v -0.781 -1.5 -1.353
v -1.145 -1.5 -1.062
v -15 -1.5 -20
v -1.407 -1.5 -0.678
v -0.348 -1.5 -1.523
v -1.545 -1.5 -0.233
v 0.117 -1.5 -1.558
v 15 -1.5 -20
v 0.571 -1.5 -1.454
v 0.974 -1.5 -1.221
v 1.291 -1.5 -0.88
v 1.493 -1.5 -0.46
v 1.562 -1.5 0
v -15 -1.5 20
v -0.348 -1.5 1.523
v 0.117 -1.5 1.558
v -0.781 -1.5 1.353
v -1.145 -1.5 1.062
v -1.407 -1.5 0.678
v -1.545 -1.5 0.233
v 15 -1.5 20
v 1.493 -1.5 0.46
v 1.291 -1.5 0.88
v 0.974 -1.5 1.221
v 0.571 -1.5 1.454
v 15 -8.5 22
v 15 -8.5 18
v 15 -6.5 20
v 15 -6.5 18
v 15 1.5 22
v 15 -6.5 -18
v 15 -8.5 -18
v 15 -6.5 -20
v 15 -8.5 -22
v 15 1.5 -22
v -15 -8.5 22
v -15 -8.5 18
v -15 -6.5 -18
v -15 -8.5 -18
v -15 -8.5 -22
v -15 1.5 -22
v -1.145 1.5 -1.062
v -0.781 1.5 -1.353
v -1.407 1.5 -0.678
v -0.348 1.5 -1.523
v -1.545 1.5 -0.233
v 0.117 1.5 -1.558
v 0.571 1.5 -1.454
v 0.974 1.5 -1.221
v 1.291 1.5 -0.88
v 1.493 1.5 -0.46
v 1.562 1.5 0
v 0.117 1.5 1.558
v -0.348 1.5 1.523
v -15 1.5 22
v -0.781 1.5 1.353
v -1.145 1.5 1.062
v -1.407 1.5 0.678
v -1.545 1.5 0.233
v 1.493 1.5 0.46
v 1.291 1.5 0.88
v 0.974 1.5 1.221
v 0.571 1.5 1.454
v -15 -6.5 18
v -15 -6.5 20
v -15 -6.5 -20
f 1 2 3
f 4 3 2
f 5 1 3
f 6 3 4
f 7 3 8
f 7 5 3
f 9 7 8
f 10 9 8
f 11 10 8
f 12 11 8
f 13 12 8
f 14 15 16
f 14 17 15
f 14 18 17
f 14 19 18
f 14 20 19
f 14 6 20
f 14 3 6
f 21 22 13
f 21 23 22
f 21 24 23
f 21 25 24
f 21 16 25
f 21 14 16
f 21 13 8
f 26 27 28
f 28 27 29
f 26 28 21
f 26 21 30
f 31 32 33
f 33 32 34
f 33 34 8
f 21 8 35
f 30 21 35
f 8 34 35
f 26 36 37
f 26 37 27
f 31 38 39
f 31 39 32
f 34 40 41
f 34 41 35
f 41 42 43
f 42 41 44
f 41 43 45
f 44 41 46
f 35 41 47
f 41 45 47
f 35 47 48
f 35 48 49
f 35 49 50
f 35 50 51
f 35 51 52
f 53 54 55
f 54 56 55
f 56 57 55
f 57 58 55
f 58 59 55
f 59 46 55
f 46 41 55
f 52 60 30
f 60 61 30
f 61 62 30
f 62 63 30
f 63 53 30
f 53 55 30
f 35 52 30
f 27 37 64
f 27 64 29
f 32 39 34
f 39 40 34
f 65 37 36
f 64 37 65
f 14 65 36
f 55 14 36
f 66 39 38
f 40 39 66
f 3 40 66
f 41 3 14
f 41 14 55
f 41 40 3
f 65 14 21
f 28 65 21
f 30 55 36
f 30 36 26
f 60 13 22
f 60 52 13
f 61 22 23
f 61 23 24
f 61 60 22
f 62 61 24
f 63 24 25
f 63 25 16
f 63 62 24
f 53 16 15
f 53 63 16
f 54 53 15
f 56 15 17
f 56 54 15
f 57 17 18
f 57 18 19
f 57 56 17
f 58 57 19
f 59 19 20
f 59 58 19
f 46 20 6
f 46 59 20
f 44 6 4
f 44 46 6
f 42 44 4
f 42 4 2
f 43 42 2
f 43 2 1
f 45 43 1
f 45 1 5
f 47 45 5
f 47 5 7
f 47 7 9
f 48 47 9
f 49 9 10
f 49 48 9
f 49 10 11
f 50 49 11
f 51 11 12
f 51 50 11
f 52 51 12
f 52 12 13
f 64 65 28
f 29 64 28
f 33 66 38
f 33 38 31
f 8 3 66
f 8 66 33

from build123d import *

# Parameters (mm, degrees)
F0_W     = 30
F0_H     = 44
F0_R     = 1.562
F1_DEPTH = 1.5
F2_W     = 30
F2_H     = 2
F3_DEPTH = 7
F4_W     = 30
F4_H     = 2
F5_DEPTH = 2
F6_W     = 30
F6_H     = 2
F7_DEPTH = 2


with BuildPart() as f1:
    # F0 (on Front) → F1 (new body, symmetric)
    with BuildSketch(Plane.XZ):
        Rectangle(F0_W, F0_H)
        Circle(F0_R, mode=Mode.SUBTRACT)
    extrude(amount=F1_DEPTH, both=True)

    # F2 (on face) → F3 (join)
    with BuildSketch(Plane.XZ.offset(1.5)):
        with Locations((0, 21)):
            Rectangle(F2_W, F2_H)
        with Locations((0, -21)):
            Rectangle(F2_W, F2_H)
    extrude(amount=F3_DEPTH)

    # F4 (on face) → F5 (join)
    with BuildSketch(Plane(origin=(0, 0, 20), x_dir=(1, 0, 0), z_dir=(0, 0, -1))):
        with Locations((0, 7.5)):
            Rectangle(F4_W, F4_H)
    extrude(amount=F5_DEPTH)

    # F6 (on face) → F7 (join)
    with BuildSketch(Plane.XY.offset(-20)):
        with Locations((0, -7.5)):
            Rectangle(F6_W, F6_H)
    extrude(amount=F7_DEPTH)


solid = f1.part
